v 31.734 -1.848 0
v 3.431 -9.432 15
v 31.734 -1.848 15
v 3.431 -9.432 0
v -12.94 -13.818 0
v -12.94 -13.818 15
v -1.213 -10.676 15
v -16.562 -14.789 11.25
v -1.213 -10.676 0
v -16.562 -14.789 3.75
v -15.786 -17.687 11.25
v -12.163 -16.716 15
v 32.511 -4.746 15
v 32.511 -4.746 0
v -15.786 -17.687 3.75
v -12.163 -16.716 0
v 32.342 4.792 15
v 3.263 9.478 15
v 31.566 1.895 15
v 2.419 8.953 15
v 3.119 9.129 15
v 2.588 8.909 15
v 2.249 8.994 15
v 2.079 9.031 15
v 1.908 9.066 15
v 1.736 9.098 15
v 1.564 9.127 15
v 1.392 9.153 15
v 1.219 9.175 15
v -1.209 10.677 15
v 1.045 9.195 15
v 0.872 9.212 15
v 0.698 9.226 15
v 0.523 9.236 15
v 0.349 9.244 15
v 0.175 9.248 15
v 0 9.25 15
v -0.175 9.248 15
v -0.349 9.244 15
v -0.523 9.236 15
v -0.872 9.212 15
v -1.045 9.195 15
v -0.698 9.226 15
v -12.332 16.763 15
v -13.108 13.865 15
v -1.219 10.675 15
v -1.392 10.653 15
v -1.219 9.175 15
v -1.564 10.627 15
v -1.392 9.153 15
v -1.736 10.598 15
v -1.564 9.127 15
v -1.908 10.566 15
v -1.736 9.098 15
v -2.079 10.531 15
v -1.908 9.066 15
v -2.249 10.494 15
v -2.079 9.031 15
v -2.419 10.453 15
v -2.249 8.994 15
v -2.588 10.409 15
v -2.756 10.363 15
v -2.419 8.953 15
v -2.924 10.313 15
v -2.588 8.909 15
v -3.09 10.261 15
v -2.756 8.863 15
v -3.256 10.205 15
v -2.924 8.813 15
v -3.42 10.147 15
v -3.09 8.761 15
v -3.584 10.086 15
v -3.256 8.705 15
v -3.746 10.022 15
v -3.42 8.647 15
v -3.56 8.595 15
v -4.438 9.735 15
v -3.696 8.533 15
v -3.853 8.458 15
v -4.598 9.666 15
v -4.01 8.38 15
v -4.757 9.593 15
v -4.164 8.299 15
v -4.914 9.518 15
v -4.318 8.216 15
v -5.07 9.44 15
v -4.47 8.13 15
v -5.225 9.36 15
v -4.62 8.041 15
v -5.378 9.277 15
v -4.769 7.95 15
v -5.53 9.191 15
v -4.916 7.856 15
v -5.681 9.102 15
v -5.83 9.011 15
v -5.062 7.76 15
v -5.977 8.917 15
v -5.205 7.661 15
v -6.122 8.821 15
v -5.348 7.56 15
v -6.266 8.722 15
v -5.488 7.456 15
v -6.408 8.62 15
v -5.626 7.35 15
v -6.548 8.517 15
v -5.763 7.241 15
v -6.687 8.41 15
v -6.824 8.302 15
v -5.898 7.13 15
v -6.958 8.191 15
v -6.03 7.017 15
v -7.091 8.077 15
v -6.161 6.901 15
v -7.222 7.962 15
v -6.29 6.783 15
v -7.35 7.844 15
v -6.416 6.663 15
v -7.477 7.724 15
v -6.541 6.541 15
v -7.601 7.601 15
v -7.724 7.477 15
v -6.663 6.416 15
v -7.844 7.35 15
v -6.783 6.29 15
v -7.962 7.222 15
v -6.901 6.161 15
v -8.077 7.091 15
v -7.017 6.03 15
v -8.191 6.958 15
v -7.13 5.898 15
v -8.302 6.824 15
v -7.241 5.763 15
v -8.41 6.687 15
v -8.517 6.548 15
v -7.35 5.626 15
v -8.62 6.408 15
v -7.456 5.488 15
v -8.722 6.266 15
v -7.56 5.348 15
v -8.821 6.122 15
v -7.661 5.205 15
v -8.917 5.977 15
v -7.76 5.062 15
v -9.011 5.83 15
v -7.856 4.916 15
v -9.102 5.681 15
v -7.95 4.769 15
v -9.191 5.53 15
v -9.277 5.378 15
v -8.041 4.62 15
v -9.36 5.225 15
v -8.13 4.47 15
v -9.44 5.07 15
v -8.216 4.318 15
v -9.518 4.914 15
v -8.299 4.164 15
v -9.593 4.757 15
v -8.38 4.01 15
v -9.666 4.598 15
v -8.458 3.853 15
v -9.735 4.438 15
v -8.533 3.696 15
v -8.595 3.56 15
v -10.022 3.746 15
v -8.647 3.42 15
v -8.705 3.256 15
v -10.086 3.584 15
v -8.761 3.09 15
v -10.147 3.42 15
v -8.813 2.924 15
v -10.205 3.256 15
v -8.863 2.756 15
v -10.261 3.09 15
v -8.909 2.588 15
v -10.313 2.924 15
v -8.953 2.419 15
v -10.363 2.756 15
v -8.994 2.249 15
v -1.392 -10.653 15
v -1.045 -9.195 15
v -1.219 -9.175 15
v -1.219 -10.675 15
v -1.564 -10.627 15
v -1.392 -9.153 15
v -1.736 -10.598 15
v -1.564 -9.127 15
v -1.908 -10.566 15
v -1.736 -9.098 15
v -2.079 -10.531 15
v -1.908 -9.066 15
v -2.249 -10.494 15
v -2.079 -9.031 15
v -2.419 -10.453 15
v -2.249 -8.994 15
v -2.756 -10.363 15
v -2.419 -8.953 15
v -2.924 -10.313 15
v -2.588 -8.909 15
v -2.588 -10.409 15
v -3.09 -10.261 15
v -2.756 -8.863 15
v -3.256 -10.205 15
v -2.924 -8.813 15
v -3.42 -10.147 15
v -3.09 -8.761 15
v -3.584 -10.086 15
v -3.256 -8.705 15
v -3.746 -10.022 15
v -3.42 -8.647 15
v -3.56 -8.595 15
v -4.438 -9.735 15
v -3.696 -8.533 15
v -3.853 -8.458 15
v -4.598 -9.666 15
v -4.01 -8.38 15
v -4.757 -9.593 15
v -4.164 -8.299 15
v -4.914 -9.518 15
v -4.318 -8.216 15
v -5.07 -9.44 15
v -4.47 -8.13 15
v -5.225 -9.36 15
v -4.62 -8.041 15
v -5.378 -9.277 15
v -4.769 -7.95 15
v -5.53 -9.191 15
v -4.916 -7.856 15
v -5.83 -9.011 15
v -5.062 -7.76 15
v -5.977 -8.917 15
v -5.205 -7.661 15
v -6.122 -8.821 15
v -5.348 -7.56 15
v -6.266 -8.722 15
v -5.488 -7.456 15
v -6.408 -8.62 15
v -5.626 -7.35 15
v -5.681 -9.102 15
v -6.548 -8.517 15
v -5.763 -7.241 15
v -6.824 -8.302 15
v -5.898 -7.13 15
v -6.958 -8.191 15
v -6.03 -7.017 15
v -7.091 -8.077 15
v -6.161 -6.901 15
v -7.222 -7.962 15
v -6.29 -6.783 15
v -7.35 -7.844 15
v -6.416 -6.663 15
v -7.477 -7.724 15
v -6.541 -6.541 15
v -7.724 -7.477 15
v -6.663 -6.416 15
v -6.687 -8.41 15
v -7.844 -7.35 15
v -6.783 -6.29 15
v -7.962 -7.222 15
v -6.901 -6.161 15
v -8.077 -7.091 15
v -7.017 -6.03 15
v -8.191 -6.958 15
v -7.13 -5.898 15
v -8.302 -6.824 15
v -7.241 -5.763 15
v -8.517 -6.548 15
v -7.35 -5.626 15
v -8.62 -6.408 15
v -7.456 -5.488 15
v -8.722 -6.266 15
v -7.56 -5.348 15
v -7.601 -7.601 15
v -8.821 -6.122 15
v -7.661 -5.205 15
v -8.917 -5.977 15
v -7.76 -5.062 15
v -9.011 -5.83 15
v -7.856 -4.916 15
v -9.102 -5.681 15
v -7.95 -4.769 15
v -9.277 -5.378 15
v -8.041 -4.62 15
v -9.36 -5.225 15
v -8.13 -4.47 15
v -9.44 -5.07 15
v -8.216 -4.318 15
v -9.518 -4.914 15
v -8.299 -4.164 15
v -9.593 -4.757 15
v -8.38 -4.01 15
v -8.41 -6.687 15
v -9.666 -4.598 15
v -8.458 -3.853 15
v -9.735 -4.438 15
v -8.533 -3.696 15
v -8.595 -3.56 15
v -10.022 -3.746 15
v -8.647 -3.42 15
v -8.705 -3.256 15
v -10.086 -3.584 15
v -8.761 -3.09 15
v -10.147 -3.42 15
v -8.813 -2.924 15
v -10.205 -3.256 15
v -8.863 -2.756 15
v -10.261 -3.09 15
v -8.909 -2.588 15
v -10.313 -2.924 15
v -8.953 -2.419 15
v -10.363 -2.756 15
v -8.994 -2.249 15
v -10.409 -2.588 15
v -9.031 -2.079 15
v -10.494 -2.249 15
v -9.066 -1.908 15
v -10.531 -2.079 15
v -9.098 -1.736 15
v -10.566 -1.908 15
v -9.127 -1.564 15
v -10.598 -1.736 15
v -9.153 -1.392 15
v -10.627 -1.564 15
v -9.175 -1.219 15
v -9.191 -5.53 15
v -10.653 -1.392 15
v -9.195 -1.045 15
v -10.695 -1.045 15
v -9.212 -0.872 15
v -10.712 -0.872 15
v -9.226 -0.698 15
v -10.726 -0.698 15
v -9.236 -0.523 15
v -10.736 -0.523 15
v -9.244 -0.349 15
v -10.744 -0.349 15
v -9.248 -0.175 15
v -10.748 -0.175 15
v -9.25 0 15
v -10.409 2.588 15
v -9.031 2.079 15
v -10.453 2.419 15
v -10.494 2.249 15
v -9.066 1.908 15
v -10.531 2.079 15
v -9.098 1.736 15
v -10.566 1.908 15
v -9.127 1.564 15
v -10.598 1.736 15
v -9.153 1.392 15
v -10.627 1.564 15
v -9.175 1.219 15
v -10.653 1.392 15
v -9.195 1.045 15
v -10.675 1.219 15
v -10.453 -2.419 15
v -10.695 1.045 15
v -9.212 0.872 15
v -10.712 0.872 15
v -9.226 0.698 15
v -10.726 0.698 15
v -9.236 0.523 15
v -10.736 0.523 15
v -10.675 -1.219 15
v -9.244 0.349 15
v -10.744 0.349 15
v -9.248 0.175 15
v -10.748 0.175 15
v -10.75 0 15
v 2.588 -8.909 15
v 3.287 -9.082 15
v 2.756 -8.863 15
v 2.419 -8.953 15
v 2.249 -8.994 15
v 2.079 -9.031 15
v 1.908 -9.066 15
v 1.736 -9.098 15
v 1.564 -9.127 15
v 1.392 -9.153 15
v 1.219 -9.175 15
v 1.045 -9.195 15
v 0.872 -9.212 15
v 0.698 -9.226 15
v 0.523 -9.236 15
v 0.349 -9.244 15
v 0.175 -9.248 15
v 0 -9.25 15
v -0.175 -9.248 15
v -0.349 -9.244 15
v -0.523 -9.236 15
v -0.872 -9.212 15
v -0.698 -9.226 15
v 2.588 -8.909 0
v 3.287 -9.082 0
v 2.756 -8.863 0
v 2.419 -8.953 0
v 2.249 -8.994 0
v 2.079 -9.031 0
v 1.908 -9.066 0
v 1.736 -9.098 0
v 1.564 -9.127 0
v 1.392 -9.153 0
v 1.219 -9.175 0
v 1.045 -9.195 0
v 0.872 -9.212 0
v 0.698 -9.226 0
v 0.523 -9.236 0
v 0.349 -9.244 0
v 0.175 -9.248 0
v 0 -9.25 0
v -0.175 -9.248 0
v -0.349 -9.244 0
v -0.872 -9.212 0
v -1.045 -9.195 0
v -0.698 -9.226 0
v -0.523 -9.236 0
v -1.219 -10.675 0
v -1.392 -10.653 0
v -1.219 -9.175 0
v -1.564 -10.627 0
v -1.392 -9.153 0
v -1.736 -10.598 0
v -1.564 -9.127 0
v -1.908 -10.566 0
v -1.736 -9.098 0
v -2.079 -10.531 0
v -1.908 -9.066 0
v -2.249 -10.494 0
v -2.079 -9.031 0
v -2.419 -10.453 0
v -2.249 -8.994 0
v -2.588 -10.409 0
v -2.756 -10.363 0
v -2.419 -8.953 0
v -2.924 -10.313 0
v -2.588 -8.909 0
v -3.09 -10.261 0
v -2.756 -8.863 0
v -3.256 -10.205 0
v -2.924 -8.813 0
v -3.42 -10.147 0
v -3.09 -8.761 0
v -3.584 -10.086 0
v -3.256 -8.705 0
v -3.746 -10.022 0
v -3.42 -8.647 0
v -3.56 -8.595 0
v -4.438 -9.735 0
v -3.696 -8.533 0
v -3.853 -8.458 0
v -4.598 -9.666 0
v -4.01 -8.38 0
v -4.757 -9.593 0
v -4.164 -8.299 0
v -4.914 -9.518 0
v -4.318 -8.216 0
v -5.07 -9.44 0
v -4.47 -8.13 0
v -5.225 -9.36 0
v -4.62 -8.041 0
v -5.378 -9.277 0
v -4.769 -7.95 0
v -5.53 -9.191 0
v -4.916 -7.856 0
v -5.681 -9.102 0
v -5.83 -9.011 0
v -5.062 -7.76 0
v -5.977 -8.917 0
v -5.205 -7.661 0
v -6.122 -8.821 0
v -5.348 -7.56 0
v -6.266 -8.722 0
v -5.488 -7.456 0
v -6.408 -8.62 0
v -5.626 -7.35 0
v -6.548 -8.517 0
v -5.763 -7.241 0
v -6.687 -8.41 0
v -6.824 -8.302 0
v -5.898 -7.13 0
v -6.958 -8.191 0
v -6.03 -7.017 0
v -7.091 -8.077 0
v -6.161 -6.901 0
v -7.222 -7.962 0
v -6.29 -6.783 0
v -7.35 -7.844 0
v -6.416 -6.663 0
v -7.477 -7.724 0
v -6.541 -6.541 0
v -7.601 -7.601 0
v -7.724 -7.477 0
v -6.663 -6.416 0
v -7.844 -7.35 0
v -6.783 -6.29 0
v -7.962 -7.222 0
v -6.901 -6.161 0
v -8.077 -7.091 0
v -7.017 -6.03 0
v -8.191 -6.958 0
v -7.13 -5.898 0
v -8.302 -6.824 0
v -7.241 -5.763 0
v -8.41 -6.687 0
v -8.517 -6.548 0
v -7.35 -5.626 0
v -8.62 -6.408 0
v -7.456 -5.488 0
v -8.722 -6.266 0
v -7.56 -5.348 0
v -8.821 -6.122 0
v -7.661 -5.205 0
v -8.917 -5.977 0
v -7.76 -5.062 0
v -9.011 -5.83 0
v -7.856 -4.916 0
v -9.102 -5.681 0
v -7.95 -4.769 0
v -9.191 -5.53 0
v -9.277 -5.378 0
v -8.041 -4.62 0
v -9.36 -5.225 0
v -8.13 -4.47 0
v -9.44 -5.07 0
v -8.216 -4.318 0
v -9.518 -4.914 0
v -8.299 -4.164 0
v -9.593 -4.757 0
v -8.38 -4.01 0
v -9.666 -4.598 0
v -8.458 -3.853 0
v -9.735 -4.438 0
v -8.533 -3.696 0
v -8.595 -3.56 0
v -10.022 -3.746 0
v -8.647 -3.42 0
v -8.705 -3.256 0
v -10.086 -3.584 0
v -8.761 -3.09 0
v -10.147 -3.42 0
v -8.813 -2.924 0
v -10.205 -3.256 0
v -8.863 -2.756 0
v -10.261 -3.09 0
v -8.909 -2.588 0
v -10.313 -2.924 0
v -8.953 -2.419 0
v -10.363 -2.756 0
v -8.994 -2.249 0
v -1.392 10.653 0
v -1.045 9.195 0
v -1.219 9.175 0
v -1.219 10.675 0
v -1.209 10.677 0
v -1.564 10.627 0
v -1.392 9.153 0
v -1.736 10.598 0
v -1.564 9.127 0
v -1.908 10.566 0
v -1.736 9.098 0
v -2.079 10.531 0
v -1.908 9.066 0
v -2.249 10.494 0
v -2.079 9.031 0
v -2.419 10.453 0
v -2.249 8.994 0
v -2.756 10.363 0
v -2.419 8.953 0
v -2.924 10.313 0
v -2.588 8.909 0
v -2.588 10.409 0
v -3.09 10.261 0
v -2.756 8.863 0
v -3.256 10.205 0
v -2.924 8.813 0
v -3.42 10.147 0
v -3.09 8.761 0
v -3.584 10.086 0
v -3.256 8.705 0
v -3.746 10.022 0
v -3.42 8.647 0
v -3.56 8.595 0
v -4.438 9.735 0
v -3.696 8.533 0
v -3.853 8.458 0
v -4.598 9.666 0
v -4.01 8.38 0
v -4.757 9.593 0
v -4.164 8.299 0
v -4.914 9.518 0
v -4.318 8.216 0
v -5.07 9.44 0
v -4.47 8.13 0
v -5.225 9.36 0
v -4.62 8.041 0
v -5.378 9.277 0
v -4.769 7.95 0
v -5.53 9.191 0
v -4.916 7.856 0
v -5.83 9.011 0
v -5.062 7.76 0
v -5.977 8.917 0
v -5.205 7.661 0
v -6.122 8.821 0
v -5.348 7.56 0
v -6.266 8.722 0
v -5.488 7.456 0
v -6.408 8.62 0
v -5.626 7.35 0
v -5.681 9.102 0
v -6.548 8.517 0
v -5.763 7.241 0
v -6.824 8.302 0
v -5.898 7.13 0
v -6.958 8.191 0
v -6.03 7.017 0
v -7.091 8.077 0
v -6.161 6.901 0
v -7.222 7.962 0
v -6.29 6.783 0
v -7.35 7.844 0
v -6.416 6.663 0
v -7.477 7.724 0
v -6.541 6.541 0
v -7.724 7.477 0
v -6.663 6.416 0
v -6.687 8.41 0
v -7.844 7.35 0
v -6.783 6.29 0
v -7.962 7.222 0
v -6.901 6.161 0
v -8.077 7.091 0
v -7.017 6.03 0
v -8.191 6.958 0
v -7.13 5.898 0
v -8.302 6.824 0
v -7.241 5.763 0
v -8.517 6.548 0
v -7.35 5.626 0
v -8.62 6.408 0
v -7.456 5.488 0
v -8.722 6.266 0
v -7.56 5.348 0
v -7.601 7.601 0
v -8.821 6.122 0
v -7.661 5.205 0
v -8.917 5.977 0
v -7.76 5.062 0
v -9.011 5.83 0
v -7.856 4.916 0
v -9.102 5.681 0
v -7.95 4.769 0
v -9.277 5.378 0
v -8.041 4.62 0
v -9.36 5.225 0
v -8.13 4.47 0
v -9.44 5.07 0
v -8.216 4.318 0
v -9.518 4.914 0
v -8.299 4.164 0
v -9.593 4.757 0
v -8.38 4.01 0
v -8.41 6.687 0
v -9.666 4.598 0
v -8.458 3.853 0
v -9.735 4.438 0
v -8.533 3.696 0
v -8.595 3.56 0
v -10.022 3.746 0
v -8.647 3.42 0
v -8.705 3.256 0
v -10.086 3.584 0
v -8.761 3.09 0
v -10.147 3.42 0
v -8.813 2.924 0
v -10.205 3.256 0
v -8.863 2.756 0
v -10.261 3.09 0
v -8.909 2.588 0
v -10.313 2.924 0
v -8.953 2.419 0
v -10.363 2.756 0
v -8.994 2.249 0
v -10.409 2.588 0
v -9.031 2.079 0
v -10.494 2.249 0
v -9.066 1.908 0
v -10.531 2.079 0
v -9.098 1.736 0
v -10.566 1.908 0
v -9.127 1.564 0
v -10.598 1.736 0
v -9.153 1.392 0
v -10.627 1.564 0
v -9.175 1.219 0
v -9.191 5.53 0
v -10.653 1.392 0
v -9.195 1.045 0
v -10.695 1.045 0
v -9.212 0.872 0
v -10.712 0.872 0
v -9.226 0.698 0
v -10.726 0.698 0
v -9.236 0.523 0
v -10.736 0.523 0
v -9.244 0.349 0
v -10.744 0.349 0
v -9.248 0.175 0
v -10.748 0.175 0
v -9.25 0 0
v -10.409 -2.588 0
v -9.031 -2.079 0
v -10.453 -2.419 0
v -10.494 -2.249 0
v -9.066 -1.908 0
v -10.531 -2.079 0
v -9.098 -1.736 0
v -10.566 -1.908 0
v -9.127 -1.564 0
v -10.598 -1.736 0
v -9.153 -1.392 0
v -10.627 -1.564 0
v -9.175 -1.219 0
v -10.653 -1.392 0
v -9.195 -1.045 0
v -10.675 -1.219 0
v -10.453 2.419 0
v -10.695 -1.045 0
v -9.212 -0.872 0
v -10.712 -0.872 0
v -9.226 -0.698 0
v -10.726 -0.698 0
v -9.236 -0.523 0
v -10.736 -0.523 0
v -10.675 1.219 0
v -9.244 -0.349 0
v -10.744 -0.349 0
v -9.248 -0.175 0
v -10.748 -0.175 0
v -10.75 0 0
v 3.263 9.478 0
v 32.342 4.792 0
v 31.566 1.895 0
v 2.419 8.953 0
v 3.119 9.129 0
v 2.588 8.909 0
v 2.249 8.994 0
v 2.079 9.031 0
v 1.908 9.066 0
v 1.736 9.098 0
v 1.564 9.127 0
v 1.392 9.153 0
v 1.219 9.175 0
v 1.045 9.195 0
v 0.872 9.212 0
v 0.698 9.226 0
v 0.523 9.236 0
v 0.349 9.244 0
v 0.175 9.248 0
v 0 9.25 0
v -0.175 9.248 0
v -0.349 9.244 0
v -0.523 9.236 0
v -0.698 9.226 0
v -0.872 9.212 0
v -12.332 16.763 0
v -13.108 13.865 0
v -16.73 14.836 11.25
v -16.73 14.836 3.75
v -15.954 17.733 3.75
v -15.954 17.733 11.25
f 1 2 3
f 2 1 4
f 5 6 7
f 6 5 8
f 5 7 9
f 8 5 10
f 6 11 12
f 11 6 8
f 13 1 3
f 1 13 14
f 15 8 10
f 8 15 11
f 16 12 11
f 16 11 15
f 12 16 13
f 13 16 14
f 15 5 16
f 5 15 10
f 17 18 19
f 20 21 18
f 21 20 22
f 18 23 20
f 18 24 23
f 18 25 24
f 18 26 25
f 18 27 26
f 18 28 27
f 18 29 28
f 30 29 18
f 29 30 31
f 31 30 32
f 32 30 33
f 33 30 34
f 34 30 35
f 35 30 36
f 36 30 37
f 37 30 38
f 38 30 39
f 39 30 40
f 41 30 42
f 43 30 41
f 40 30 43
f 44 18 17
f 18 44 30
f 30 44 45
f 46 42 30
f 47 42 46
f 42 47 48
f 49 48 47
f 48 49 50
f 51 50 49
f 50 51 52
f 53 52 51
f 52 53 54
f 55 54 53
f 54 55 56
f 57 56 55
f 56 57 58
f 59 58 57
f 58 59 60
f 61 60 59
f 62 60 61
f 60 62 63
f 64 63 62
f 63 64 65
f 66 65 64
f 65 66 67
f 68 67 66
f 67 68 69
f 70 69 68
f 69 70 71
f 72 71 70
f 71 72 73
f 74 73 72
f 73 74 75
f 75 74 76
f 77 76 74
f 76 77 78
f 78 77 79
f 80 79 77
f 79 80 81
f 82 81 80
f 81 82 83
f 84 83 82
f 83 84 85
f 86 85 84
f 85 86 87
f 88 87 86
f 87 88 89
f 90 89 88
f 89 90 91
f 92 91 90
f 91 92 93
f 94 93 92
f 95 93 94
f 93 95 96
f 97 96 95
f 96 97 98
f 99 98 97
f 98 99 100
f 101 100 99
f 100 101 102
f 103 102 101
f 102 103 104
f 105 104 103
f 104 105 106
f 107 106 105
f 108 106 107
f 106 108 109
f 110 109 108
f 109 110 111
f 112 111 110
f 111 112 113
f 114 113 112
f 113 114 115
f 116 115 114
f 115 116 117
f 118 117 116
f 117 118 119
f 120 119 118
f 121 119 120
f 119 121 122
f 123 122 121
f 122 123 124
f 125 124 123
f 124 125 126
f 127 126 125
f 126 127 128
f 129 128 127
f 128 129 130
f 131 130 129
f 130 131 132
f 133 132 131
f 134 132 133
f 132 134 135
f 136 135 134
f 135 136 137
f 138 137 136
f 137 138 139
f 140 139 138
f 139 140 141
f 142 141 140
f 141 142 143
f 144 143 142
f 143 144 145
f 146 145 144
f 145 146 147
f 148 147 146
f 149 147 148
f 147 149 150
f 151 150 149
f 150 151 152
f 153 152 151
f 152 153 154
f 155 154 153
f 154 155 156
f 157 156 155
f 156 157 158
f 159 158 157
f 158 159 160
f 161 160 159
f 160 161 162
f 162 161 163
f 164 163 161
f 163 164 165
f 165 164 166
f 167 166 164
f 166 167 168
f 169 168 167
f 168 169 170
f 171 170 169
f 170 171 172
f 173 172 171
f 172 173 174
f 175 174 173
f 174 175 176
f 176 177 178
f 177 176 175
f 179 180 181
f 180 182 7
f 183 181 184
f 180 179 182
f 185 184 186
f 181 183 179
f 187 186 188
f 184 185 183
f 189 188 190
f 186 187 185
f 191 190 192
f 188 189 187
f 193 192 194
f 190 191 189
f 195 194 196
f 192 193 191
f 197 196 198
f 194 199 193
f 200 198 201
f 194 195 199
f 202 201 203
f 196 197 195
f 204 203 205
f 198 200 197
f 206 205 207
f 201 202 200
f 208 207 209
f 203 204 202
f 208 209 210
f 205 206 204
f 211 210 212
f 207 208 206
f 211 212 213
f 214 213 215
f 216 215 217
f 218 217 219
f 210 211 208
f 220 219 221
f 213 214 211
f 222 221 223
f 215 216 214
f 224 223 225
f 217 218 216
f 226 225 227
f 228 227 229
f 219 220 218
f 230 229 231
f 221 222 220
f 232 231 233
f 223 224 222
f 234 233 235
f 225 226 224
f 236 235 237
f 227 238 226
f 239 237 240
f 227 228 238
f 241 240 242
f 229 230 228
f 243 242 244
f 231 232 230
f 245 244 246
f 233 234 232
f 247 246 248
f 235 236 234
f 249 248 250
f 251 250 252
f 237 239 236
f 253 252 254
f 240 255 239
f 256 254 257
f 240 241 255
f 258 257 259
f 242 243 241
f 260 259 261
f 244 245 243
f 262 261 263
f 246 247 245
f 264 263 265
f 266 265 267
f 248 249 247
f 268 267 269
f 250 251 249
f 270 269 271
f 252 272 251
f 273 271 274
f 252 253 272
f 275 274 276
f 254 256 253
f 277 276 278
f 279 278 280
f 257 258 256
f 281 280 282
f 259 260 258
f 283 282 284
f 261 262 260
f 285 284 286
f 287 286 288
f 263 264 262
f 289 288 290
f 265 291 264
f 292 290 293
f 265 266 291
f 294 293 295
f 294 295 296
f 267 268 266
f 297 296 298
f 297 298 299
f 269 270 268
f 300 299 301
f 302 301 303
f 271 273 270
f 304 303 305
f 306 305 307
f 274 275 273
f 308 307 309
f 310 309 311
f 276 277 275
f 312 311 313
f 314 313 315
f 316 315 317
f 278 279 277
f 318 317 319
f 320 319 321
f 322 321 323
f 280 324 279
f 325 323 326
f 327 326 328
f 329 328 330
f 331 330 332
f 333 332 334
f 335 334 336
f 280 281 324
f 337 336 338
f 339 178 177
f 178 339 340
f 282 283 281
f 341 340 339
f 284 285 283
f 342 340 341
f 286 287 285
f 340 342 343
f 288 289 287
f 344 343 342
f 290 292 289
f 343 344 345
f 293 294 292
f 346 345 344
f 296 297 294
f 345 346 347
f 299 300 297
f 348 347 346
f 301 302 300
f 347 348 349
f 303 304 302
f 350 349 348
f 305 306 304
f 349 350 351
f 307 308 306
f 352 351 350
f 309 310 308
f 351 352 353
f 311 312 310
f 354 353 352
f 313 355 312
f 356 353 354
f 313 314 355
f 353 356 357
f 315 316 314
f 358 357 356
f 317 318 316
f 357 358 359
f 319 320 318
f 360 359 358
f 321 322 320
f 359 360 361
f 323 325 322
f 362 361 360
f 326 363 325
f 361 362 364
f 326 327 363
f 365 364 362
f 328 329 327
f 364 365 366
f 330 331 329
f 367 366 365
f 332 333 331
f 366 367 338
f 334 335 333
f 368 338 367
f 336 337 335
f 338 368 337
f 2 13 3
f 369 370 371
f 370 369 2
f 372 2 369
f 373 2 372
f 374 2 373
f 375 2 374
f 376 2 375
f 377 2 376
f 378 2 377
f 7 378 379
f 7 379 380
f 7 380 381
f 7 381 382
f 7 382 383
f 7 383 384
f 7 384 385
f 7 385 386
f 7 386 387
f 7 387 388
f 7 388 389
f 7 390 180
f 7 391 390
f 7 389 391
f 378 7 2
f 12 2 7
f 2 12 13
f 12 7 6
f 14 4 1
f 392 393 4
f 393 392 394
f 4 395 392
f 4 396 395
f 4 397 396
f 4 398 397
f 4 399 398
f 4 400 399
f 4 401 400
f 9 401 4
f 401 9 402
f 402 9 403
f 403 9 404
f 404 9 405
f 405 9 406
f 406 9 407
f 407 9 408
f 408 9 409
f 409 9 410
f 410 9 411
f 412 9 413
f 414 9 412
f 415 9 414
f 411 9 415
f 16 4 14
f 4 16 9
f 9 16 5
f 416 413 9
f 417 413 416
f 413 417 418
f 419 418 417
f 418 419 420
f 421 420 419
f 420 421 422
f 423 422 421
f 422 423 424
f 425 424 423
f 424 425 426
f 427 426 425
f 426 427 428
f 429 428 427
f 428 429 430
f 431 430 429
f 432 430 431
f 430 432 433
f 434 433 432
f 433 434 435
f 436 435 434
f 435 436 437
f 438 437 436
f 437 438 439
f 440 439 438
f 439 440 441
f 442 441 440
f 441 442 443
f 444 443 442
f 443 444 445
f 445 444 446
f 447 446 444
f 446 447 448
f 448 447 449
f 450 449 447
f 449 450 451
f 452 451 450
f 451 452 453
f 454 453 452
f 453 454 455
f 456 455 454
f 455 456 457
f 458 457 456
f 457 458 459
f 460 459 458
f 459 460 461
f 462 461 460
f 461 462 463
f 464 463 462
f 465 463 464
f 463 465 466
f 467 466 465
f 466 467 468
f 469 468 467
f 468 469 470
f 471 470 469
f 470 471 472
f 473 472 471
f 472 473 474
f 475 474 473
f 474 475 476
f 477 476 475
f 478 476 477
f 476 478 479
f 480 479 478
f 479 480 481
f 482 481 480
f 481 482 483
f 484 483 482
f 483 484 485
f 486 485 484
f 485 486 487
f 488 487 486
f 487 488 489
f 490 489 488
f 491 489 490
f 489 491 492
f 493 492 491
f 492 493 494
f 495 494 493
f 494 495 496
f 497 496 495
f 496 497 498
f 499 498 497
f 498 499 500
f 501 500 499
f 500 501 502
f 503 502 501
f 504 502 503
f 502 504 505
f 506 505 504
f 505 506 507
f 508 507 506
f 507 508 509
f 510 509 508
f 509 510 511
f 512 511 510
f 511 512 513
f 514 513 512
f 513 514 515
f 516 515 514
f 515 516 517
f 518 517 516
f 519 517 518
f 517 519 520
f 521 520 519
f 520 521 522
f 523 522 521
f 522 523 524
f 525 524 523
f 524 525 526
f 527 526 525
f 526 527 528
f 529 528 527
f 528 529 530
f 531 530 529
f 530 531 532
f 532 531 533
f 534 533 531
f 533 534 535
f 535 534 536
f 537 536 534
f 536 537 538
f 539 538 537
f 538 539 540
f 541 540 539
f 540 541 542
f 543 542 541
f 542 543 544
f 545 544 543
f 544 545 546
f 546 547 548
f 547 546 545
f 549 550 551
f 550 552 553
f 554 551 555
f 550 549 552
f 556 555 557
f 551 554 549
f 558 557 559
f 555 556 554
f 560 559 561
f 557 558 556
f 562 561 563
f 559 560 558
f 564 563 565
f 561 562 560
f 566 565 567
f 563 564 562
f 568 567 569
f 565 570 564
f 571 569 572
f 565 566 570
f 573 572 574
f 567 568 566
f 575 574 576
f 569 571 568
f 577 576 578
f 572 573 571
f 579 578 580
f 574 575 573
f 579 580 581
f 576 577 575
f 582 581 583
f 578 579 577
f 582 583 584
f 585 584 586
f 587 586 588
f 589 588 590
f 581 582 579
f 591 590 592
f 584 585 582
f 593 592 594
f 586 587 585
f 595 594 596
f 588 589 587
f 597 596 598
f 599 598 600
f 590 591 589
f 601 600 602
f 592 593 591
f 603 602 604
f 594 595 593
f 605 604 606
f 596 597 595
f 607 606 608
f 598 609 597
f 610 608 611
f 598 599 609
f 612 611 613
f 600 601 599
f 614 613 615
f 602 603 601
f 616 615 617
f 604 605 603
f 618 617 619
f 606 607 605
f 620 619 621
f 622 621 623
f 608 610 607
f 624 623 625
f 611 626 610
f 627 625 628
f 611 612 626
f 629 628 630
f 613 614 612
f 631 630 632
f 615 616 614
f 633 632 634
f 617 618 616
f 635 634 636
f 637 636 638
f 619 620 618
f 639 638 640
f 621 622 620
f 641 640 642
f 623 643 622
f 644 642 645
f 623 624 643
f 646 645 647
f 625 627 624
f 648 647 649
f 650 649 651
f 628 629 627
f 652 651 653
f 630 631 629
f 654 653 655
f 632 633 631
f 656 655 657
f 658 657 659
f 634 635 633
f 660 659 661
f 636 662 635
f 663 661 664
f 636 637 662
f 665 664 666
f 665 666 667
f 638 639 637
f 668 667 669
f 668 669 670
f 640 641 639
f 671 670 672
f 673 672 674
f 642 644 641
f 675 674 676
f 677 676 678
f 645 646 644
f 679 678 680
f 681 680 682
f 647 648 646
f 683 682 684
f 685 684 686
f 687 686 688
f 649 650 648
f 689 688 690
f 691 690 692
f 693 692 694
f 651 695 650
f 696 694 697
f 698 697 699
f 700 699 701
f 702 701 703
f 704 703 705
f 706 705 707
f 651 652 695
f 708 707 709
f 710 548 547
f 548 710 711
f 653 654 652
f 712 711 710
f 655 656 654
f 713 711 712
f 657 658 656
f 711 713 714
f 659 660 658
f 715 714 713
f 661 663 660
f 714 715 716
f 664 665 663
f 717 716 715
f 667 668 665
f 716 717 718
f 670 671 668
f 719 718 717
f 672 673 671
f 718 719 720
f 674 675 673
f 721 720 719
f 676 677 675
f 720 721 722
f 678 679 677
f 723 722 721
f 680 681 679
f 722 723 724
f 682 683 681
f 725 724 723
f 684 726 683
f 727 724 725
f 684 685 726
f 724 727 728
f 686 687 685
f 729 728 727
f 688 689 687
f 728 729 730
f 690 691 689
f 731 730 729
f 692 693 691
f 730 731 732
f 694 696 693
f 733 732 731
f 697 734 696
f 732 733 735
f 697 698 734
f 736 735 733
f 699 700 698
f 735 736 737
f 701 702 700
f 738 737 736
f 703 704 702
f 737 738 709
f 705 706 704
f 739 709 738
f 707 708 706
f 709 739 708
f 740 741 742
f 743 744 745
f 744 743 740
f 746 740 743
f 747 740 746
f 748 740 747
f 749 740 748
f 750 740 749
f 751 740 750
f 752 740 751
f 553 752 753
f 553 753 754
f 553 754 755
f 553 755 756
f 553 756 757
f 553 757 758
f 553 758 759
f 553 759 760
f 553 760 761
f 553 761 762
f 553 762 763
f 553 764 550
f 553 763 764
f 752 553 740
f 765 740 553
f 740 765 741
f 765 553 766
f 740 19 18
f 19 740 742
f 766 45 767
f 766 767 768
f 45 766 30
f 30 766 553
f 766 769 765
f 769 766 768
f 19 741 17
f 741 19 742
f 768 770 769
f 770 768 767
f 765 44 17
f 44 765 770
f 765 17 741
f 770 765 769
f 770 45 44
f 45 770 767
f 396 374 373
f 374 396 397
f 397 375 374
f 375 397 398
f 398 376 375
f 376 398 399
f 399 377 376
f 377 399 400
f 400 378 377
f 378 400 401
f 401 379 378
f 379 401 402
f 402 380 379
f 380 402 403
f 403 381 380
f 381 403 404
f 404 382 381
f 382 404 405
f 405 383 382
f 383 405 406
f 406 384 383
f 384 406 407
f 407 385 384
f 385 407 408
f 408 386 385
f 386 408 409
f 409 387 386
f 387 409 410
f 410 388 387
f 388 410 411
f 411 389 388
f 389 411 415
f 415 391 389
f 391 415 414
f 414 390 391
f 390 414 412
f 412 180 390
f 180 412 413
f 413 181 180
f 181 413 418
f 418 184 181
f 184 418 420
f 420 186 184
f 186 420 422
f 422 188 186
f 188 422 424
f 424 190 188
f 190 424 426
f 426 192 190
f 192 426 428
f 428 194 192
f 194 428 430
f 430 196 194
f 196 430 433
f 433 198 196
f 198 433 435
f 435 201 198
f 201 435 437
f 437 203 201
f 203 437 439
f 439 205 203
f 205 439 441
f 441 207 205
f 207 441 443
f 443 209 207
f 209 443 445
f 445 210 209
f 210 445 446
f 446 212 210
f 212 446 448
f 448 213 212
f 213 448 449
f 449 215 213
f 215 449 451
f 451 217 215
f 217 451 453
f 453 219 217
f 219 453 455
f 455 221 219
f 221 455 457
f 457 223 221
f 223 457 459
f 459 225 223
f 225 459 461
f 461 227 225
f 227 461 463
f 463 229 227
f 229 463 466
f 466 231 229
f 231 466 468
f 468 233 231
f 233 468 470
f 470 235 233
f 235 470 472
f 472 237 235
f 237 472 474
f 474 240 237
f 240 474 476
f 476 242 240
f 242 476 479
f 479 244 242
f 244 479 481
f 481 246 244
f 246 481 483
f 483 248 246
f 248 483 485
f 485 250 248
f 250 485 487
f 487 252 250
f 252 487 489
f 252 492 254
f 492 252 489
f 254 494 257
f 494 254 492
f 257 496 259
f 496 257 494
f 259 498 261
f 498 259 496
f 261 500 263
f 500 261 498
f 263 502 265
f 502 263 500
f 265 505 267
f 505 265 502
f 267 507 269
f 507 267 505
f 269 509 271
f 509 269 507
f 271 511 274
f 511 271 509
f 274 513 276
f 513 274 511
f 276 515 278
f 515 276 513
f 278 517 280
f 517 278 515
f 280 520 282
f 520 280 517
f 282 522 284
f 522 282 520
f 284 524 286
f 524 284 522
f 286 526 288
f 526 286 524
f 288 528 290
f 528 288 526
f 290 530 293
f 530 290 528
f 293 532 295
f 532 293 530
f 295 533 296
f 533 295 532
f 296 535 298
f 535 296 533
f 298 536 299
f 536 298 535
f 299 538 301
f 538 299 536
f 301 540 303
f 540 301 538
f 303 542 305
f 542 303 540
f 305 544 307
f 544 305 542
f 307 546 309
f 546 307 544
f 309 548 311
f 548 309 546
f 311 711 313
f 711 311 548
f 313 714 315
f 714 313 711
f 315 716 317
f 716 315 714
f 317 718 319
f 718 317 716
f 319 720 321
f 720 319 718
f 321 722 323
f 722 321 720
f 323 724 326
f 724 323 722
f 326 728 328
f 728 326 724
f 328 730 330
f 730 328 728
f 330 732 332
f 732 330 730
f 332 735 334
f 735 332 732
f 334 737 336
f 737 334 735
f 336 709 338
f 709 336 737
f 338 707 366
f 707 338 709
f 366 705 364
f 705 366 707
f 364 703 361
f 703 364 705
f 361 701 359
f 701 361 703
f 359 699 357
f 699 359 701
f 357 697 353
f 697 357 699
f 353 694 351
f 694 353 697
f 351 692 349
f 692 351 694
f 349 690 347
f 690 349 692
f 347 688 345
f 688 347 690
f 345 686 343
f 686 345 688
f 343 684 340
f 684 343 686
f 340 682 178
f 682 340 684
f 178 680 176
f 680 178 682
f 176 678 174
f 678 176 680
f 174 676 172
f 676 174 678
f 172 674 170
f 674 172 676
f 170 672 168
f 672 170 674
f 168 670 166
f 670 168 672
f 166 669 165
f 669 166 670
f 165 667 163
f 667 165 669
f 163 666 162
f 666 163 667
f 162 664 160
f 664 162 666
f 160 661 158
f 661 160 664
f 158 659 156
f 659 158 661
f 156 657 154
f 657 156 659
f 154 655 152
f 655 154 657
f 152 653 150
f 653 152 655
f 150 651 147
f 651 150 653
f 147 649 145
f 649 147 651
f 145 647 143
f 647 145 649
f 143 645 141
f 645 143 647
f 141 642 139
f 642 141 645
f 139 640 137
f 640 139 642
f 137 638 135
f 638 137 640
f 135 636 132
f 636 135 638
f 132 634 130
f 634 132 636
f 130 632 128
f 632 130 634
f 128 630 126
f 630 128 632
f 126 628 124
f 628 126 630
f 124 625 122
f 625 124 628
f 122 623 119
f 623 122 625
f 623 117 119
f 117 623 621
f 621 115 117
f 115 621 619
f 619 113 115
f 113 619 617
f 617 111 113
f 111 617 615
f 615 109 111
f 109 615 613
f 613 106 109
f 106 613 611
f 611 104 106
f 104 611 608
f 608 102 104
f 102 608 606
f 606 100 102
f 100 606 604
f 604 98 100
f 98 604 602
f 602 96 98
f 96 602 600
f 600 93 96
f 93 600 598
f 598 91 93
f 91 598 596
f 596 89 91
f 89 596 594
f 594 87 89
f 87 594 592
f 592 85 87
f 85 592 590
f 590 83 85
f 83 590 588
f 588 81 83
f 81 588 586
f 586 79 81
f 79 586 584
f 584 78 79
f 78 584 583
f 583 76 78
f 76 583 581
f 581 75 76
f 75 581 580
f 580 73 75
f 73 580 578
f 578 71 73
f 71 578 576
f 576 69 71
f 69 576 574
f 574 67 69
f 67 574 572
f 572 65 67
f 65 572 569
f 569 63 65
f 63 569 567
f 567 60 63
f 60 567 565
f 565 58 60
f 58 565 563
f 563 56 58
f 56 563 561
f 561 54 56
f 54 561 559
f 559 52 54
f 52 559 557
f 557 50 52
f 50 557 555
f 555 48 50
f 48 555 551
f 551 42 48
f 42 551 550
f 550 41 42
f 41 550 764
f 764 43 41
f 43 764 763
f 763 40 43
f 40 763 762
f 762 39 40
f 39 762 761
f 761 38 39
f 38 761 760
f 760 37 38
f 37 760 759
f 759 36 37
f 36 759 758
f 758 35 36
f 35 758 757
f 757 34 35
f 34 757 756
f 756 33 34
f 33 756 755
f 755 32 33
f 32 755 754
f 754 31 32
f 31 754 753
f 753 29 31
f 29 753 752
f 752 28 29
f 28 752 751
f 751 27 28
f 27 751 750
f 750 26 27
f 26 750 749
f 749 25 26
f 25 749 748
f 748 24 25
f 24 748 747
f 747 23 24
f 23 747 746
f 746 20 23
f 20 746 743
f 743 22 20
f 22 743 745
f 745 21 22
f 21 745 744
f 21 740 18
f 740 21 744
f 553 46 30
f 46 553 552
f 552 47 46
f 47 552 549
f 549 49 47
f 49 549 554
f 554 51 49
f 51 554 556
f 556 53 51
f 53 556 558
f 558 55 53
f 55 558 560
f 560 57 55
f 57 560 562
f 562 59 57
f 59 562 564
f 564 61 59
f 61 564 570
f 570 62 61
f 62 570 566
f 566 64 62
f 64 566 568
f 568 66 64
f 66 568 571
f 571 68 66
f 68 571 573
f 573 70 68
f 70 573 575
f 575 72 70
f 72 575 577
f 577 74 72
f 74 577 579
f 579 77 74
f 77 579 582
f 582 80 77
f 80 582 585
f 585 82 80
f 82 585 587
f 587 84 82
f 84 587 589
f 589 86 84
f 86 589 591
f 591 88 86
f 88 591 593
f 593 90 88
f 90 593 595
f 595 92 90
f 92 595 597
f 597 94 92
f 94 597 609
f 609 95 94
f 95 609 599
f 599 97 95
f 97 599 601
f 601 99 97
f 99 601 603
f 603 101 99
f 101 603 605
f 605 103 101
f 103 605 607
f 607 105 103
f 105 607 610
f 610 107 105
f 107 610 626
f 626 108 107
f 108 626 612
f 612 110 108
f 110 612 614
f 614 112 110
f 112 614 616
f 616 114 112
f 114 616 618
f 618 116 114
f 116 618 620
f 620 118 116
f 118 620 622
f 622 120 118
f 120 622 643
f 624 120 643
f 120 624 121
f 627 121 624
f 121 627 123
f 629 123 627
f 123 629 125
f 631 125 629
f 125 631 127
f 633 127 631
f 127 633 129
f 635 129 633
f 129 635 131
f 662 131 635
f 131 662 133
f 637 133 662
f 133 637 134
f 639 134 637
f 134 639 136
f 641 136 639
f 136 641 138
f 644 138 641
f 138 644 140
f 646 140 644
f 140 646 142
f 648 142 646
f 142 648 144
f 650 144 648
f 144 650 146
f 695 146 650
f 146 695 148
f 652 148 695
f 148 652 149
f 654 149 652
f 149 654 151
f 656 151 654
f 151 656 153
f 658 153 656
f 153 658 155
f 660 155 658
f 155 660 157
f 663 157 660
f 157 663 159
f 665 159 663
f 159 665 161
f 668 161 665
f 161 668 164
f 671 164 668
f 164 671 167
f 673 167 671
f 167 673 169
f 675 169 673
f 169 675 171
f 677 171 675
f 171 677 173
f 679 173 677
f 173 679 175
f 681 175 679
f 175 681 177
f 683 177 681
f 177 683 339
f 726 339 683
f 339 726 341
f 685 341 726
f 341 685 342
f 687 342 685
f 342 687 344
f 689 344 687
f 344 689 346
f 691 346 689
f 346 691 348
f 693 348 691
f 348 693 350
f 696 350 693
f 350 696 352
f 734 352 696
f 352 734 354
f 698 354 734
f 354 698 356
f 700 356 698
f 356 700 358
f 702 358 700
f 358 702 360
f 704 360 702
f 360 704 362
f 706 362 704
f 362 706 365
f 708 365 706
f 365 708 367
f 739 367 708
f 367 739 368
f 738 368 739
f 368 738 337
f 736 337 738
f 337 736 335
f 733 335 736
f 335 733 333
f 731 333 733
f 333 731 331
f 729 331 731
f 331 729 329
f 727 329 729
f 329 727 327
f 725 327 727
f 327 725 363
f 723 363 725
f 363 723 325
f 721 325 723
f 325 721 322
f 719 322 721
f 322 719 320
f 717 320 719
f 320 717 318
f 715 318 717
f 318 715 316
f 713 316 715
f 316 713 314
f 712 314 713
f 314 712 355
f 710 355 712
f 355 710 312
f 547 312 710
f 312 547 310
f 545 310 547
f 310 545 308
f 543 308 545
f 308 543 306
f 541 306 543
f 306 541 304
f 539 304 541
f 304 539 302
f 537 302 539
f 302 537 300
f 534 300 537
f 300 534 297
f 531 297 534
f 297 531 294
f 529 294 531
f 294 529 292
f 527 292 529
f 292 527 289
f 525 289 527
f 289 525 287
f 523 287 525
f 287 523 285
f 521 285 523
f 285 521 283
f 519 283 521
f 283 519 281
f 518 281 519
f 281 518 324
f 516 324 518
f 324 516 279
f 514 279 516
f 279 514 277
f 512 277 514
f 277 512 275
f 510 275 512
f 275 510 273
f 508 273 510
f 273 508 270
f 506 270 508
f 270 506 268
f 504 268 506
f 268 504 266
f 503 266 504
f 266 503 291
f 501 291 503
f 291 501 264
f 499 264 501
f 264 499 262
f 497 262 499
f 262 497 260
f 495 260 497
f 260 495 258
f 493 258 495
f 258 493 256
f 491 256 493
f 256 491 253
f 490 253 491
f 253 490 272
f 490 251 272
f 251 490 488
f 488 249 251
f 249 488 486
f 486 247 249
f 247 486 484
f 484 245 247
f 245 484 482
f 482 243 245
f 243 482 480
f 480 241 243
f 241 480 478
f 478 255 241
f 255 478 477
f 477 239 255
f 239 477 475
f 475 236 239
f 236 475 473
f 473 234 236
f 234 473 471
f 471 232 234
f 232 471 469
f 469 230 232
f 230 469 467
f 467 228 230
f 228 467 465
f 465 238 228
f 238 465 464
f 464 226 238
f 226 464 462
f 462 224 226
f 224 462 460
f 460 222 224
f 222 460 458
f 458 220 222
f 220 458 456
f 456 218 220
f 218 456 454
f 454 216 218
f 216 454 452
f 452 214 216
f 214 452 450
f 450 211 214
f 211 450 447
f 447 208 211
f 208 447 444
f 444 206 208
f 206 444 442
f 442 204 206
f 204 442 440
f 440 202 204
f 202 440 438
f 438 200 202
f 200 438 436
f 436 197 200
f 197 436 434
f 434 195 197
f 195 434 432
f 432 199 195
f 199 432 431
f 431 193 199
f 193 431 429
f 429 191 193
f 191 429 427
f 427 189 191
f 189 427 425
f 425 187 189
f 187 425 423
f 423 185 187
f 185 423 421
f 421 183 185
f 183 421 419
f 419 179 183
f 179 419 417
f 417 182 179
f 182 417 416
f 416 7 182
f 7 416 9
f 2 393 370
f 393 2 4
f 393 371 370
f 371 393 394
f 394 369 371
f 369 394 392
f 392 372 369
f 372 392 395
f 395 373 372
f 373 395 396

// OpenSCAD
width = 15;
spacing = 20;
restAngle = 30;
jawLength = 30;
handleLength = 20;
jawThickness = 3;
bottomTeethOffset = 5;
bottomToothHeight = 2;
bottomToothWidth = 1.5;
bottomToothSet = 0.3; // 0.5 for symmetric teeth
topTeethOffset = 5;
topToothHeight = 0;
topToothWidth = 1.5;
topToothSet = 0.3; // 0.5 for symmetric teeth
springThickness = 1.5;

module dummy(){}

nudge = 0.01;

module ribbon(points, thickness=1, closed=false) {
    p = closed ? concat(points, [points[0]]) : points;
    
    union() {
        for (i=[1:len(p)-1]) {
            hull() {
                translate(p[i-1]) circle(d=thickness, $fn=8);
                translate(p[i]) circle(d=thickness, $fn=8);
            }
        }
    }
}

module jaw(toothHeight, toothWidth, toothSet, teethOffset) {
    translate([-handleLength,-jawThickness]) {
       translate([0,0,width]) rotate([-90,0,0]) 
        linear_extrude(height=jawThickness) 
        polygon([[jawLength+handleLength,width],[jawLength+handleLength,0],[0.25*width,0],[0,0.25*width],[0,0.75*width],[0.25*width,width]]);
linear_extrude(height=width) {
            if (toothHeight > 0) {
               n = floor((jawLength-teethOffset) / toothWidth);
               for (i=[0:n-1]) {
                   x = jawLength+handleLength - (i+1)*toothWidth;           
                   translate([0,-nudge])
                   polygon([[x,jawThickness],[x+toothWidth*toothSet,jawThickness+toothHeight],[x+toothWidth,jawThickness]]);
               } 
            }
        }
    }
}


circleAngle = 90.-restAngle/2.;

springPoints = [for (n=[circleAngle:1:360-circleAngle+1]) (spacing/2)*[cos(n),sin(n)]];
    
linear_extrude(height=width) {
    ribbon(springPoints, thickness=springThickness);
}

    translate(springPoints[len(springPoints)-1])    
    rotate([0,0,restAngle/2.]) jaw(bottomToothHeight, bottomToothWidth, bottomToothSet, bottomTeethOffset);
    translate(springPoints[0]) rotate([0,0,-restAngle/2.]) translate([0,0,width]) rotate([180,0,0]) jaw(bottomToothHeight, bottomToothWidth, topToothSet, bottomTeethOffset);
